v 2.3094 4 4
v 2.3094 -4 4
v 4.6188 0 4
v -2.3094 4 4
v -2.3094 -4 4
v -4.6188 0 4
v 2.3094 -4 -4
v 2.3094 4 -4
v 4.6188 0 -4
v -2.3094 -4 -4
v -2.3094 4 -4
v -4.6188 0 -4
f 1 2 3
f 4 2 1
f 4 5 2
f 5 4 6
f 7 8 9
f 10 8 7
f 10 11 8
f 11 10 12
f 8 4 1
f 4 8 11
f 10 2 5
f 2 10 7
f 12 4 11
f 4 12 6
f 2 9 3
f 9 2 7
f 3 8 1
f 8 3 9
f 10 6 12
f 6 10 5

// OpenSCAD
intersection_for (a = [0 : 60 : 120]) rotate([0, 0, a]) cube([30, 8, 8], center = true);
